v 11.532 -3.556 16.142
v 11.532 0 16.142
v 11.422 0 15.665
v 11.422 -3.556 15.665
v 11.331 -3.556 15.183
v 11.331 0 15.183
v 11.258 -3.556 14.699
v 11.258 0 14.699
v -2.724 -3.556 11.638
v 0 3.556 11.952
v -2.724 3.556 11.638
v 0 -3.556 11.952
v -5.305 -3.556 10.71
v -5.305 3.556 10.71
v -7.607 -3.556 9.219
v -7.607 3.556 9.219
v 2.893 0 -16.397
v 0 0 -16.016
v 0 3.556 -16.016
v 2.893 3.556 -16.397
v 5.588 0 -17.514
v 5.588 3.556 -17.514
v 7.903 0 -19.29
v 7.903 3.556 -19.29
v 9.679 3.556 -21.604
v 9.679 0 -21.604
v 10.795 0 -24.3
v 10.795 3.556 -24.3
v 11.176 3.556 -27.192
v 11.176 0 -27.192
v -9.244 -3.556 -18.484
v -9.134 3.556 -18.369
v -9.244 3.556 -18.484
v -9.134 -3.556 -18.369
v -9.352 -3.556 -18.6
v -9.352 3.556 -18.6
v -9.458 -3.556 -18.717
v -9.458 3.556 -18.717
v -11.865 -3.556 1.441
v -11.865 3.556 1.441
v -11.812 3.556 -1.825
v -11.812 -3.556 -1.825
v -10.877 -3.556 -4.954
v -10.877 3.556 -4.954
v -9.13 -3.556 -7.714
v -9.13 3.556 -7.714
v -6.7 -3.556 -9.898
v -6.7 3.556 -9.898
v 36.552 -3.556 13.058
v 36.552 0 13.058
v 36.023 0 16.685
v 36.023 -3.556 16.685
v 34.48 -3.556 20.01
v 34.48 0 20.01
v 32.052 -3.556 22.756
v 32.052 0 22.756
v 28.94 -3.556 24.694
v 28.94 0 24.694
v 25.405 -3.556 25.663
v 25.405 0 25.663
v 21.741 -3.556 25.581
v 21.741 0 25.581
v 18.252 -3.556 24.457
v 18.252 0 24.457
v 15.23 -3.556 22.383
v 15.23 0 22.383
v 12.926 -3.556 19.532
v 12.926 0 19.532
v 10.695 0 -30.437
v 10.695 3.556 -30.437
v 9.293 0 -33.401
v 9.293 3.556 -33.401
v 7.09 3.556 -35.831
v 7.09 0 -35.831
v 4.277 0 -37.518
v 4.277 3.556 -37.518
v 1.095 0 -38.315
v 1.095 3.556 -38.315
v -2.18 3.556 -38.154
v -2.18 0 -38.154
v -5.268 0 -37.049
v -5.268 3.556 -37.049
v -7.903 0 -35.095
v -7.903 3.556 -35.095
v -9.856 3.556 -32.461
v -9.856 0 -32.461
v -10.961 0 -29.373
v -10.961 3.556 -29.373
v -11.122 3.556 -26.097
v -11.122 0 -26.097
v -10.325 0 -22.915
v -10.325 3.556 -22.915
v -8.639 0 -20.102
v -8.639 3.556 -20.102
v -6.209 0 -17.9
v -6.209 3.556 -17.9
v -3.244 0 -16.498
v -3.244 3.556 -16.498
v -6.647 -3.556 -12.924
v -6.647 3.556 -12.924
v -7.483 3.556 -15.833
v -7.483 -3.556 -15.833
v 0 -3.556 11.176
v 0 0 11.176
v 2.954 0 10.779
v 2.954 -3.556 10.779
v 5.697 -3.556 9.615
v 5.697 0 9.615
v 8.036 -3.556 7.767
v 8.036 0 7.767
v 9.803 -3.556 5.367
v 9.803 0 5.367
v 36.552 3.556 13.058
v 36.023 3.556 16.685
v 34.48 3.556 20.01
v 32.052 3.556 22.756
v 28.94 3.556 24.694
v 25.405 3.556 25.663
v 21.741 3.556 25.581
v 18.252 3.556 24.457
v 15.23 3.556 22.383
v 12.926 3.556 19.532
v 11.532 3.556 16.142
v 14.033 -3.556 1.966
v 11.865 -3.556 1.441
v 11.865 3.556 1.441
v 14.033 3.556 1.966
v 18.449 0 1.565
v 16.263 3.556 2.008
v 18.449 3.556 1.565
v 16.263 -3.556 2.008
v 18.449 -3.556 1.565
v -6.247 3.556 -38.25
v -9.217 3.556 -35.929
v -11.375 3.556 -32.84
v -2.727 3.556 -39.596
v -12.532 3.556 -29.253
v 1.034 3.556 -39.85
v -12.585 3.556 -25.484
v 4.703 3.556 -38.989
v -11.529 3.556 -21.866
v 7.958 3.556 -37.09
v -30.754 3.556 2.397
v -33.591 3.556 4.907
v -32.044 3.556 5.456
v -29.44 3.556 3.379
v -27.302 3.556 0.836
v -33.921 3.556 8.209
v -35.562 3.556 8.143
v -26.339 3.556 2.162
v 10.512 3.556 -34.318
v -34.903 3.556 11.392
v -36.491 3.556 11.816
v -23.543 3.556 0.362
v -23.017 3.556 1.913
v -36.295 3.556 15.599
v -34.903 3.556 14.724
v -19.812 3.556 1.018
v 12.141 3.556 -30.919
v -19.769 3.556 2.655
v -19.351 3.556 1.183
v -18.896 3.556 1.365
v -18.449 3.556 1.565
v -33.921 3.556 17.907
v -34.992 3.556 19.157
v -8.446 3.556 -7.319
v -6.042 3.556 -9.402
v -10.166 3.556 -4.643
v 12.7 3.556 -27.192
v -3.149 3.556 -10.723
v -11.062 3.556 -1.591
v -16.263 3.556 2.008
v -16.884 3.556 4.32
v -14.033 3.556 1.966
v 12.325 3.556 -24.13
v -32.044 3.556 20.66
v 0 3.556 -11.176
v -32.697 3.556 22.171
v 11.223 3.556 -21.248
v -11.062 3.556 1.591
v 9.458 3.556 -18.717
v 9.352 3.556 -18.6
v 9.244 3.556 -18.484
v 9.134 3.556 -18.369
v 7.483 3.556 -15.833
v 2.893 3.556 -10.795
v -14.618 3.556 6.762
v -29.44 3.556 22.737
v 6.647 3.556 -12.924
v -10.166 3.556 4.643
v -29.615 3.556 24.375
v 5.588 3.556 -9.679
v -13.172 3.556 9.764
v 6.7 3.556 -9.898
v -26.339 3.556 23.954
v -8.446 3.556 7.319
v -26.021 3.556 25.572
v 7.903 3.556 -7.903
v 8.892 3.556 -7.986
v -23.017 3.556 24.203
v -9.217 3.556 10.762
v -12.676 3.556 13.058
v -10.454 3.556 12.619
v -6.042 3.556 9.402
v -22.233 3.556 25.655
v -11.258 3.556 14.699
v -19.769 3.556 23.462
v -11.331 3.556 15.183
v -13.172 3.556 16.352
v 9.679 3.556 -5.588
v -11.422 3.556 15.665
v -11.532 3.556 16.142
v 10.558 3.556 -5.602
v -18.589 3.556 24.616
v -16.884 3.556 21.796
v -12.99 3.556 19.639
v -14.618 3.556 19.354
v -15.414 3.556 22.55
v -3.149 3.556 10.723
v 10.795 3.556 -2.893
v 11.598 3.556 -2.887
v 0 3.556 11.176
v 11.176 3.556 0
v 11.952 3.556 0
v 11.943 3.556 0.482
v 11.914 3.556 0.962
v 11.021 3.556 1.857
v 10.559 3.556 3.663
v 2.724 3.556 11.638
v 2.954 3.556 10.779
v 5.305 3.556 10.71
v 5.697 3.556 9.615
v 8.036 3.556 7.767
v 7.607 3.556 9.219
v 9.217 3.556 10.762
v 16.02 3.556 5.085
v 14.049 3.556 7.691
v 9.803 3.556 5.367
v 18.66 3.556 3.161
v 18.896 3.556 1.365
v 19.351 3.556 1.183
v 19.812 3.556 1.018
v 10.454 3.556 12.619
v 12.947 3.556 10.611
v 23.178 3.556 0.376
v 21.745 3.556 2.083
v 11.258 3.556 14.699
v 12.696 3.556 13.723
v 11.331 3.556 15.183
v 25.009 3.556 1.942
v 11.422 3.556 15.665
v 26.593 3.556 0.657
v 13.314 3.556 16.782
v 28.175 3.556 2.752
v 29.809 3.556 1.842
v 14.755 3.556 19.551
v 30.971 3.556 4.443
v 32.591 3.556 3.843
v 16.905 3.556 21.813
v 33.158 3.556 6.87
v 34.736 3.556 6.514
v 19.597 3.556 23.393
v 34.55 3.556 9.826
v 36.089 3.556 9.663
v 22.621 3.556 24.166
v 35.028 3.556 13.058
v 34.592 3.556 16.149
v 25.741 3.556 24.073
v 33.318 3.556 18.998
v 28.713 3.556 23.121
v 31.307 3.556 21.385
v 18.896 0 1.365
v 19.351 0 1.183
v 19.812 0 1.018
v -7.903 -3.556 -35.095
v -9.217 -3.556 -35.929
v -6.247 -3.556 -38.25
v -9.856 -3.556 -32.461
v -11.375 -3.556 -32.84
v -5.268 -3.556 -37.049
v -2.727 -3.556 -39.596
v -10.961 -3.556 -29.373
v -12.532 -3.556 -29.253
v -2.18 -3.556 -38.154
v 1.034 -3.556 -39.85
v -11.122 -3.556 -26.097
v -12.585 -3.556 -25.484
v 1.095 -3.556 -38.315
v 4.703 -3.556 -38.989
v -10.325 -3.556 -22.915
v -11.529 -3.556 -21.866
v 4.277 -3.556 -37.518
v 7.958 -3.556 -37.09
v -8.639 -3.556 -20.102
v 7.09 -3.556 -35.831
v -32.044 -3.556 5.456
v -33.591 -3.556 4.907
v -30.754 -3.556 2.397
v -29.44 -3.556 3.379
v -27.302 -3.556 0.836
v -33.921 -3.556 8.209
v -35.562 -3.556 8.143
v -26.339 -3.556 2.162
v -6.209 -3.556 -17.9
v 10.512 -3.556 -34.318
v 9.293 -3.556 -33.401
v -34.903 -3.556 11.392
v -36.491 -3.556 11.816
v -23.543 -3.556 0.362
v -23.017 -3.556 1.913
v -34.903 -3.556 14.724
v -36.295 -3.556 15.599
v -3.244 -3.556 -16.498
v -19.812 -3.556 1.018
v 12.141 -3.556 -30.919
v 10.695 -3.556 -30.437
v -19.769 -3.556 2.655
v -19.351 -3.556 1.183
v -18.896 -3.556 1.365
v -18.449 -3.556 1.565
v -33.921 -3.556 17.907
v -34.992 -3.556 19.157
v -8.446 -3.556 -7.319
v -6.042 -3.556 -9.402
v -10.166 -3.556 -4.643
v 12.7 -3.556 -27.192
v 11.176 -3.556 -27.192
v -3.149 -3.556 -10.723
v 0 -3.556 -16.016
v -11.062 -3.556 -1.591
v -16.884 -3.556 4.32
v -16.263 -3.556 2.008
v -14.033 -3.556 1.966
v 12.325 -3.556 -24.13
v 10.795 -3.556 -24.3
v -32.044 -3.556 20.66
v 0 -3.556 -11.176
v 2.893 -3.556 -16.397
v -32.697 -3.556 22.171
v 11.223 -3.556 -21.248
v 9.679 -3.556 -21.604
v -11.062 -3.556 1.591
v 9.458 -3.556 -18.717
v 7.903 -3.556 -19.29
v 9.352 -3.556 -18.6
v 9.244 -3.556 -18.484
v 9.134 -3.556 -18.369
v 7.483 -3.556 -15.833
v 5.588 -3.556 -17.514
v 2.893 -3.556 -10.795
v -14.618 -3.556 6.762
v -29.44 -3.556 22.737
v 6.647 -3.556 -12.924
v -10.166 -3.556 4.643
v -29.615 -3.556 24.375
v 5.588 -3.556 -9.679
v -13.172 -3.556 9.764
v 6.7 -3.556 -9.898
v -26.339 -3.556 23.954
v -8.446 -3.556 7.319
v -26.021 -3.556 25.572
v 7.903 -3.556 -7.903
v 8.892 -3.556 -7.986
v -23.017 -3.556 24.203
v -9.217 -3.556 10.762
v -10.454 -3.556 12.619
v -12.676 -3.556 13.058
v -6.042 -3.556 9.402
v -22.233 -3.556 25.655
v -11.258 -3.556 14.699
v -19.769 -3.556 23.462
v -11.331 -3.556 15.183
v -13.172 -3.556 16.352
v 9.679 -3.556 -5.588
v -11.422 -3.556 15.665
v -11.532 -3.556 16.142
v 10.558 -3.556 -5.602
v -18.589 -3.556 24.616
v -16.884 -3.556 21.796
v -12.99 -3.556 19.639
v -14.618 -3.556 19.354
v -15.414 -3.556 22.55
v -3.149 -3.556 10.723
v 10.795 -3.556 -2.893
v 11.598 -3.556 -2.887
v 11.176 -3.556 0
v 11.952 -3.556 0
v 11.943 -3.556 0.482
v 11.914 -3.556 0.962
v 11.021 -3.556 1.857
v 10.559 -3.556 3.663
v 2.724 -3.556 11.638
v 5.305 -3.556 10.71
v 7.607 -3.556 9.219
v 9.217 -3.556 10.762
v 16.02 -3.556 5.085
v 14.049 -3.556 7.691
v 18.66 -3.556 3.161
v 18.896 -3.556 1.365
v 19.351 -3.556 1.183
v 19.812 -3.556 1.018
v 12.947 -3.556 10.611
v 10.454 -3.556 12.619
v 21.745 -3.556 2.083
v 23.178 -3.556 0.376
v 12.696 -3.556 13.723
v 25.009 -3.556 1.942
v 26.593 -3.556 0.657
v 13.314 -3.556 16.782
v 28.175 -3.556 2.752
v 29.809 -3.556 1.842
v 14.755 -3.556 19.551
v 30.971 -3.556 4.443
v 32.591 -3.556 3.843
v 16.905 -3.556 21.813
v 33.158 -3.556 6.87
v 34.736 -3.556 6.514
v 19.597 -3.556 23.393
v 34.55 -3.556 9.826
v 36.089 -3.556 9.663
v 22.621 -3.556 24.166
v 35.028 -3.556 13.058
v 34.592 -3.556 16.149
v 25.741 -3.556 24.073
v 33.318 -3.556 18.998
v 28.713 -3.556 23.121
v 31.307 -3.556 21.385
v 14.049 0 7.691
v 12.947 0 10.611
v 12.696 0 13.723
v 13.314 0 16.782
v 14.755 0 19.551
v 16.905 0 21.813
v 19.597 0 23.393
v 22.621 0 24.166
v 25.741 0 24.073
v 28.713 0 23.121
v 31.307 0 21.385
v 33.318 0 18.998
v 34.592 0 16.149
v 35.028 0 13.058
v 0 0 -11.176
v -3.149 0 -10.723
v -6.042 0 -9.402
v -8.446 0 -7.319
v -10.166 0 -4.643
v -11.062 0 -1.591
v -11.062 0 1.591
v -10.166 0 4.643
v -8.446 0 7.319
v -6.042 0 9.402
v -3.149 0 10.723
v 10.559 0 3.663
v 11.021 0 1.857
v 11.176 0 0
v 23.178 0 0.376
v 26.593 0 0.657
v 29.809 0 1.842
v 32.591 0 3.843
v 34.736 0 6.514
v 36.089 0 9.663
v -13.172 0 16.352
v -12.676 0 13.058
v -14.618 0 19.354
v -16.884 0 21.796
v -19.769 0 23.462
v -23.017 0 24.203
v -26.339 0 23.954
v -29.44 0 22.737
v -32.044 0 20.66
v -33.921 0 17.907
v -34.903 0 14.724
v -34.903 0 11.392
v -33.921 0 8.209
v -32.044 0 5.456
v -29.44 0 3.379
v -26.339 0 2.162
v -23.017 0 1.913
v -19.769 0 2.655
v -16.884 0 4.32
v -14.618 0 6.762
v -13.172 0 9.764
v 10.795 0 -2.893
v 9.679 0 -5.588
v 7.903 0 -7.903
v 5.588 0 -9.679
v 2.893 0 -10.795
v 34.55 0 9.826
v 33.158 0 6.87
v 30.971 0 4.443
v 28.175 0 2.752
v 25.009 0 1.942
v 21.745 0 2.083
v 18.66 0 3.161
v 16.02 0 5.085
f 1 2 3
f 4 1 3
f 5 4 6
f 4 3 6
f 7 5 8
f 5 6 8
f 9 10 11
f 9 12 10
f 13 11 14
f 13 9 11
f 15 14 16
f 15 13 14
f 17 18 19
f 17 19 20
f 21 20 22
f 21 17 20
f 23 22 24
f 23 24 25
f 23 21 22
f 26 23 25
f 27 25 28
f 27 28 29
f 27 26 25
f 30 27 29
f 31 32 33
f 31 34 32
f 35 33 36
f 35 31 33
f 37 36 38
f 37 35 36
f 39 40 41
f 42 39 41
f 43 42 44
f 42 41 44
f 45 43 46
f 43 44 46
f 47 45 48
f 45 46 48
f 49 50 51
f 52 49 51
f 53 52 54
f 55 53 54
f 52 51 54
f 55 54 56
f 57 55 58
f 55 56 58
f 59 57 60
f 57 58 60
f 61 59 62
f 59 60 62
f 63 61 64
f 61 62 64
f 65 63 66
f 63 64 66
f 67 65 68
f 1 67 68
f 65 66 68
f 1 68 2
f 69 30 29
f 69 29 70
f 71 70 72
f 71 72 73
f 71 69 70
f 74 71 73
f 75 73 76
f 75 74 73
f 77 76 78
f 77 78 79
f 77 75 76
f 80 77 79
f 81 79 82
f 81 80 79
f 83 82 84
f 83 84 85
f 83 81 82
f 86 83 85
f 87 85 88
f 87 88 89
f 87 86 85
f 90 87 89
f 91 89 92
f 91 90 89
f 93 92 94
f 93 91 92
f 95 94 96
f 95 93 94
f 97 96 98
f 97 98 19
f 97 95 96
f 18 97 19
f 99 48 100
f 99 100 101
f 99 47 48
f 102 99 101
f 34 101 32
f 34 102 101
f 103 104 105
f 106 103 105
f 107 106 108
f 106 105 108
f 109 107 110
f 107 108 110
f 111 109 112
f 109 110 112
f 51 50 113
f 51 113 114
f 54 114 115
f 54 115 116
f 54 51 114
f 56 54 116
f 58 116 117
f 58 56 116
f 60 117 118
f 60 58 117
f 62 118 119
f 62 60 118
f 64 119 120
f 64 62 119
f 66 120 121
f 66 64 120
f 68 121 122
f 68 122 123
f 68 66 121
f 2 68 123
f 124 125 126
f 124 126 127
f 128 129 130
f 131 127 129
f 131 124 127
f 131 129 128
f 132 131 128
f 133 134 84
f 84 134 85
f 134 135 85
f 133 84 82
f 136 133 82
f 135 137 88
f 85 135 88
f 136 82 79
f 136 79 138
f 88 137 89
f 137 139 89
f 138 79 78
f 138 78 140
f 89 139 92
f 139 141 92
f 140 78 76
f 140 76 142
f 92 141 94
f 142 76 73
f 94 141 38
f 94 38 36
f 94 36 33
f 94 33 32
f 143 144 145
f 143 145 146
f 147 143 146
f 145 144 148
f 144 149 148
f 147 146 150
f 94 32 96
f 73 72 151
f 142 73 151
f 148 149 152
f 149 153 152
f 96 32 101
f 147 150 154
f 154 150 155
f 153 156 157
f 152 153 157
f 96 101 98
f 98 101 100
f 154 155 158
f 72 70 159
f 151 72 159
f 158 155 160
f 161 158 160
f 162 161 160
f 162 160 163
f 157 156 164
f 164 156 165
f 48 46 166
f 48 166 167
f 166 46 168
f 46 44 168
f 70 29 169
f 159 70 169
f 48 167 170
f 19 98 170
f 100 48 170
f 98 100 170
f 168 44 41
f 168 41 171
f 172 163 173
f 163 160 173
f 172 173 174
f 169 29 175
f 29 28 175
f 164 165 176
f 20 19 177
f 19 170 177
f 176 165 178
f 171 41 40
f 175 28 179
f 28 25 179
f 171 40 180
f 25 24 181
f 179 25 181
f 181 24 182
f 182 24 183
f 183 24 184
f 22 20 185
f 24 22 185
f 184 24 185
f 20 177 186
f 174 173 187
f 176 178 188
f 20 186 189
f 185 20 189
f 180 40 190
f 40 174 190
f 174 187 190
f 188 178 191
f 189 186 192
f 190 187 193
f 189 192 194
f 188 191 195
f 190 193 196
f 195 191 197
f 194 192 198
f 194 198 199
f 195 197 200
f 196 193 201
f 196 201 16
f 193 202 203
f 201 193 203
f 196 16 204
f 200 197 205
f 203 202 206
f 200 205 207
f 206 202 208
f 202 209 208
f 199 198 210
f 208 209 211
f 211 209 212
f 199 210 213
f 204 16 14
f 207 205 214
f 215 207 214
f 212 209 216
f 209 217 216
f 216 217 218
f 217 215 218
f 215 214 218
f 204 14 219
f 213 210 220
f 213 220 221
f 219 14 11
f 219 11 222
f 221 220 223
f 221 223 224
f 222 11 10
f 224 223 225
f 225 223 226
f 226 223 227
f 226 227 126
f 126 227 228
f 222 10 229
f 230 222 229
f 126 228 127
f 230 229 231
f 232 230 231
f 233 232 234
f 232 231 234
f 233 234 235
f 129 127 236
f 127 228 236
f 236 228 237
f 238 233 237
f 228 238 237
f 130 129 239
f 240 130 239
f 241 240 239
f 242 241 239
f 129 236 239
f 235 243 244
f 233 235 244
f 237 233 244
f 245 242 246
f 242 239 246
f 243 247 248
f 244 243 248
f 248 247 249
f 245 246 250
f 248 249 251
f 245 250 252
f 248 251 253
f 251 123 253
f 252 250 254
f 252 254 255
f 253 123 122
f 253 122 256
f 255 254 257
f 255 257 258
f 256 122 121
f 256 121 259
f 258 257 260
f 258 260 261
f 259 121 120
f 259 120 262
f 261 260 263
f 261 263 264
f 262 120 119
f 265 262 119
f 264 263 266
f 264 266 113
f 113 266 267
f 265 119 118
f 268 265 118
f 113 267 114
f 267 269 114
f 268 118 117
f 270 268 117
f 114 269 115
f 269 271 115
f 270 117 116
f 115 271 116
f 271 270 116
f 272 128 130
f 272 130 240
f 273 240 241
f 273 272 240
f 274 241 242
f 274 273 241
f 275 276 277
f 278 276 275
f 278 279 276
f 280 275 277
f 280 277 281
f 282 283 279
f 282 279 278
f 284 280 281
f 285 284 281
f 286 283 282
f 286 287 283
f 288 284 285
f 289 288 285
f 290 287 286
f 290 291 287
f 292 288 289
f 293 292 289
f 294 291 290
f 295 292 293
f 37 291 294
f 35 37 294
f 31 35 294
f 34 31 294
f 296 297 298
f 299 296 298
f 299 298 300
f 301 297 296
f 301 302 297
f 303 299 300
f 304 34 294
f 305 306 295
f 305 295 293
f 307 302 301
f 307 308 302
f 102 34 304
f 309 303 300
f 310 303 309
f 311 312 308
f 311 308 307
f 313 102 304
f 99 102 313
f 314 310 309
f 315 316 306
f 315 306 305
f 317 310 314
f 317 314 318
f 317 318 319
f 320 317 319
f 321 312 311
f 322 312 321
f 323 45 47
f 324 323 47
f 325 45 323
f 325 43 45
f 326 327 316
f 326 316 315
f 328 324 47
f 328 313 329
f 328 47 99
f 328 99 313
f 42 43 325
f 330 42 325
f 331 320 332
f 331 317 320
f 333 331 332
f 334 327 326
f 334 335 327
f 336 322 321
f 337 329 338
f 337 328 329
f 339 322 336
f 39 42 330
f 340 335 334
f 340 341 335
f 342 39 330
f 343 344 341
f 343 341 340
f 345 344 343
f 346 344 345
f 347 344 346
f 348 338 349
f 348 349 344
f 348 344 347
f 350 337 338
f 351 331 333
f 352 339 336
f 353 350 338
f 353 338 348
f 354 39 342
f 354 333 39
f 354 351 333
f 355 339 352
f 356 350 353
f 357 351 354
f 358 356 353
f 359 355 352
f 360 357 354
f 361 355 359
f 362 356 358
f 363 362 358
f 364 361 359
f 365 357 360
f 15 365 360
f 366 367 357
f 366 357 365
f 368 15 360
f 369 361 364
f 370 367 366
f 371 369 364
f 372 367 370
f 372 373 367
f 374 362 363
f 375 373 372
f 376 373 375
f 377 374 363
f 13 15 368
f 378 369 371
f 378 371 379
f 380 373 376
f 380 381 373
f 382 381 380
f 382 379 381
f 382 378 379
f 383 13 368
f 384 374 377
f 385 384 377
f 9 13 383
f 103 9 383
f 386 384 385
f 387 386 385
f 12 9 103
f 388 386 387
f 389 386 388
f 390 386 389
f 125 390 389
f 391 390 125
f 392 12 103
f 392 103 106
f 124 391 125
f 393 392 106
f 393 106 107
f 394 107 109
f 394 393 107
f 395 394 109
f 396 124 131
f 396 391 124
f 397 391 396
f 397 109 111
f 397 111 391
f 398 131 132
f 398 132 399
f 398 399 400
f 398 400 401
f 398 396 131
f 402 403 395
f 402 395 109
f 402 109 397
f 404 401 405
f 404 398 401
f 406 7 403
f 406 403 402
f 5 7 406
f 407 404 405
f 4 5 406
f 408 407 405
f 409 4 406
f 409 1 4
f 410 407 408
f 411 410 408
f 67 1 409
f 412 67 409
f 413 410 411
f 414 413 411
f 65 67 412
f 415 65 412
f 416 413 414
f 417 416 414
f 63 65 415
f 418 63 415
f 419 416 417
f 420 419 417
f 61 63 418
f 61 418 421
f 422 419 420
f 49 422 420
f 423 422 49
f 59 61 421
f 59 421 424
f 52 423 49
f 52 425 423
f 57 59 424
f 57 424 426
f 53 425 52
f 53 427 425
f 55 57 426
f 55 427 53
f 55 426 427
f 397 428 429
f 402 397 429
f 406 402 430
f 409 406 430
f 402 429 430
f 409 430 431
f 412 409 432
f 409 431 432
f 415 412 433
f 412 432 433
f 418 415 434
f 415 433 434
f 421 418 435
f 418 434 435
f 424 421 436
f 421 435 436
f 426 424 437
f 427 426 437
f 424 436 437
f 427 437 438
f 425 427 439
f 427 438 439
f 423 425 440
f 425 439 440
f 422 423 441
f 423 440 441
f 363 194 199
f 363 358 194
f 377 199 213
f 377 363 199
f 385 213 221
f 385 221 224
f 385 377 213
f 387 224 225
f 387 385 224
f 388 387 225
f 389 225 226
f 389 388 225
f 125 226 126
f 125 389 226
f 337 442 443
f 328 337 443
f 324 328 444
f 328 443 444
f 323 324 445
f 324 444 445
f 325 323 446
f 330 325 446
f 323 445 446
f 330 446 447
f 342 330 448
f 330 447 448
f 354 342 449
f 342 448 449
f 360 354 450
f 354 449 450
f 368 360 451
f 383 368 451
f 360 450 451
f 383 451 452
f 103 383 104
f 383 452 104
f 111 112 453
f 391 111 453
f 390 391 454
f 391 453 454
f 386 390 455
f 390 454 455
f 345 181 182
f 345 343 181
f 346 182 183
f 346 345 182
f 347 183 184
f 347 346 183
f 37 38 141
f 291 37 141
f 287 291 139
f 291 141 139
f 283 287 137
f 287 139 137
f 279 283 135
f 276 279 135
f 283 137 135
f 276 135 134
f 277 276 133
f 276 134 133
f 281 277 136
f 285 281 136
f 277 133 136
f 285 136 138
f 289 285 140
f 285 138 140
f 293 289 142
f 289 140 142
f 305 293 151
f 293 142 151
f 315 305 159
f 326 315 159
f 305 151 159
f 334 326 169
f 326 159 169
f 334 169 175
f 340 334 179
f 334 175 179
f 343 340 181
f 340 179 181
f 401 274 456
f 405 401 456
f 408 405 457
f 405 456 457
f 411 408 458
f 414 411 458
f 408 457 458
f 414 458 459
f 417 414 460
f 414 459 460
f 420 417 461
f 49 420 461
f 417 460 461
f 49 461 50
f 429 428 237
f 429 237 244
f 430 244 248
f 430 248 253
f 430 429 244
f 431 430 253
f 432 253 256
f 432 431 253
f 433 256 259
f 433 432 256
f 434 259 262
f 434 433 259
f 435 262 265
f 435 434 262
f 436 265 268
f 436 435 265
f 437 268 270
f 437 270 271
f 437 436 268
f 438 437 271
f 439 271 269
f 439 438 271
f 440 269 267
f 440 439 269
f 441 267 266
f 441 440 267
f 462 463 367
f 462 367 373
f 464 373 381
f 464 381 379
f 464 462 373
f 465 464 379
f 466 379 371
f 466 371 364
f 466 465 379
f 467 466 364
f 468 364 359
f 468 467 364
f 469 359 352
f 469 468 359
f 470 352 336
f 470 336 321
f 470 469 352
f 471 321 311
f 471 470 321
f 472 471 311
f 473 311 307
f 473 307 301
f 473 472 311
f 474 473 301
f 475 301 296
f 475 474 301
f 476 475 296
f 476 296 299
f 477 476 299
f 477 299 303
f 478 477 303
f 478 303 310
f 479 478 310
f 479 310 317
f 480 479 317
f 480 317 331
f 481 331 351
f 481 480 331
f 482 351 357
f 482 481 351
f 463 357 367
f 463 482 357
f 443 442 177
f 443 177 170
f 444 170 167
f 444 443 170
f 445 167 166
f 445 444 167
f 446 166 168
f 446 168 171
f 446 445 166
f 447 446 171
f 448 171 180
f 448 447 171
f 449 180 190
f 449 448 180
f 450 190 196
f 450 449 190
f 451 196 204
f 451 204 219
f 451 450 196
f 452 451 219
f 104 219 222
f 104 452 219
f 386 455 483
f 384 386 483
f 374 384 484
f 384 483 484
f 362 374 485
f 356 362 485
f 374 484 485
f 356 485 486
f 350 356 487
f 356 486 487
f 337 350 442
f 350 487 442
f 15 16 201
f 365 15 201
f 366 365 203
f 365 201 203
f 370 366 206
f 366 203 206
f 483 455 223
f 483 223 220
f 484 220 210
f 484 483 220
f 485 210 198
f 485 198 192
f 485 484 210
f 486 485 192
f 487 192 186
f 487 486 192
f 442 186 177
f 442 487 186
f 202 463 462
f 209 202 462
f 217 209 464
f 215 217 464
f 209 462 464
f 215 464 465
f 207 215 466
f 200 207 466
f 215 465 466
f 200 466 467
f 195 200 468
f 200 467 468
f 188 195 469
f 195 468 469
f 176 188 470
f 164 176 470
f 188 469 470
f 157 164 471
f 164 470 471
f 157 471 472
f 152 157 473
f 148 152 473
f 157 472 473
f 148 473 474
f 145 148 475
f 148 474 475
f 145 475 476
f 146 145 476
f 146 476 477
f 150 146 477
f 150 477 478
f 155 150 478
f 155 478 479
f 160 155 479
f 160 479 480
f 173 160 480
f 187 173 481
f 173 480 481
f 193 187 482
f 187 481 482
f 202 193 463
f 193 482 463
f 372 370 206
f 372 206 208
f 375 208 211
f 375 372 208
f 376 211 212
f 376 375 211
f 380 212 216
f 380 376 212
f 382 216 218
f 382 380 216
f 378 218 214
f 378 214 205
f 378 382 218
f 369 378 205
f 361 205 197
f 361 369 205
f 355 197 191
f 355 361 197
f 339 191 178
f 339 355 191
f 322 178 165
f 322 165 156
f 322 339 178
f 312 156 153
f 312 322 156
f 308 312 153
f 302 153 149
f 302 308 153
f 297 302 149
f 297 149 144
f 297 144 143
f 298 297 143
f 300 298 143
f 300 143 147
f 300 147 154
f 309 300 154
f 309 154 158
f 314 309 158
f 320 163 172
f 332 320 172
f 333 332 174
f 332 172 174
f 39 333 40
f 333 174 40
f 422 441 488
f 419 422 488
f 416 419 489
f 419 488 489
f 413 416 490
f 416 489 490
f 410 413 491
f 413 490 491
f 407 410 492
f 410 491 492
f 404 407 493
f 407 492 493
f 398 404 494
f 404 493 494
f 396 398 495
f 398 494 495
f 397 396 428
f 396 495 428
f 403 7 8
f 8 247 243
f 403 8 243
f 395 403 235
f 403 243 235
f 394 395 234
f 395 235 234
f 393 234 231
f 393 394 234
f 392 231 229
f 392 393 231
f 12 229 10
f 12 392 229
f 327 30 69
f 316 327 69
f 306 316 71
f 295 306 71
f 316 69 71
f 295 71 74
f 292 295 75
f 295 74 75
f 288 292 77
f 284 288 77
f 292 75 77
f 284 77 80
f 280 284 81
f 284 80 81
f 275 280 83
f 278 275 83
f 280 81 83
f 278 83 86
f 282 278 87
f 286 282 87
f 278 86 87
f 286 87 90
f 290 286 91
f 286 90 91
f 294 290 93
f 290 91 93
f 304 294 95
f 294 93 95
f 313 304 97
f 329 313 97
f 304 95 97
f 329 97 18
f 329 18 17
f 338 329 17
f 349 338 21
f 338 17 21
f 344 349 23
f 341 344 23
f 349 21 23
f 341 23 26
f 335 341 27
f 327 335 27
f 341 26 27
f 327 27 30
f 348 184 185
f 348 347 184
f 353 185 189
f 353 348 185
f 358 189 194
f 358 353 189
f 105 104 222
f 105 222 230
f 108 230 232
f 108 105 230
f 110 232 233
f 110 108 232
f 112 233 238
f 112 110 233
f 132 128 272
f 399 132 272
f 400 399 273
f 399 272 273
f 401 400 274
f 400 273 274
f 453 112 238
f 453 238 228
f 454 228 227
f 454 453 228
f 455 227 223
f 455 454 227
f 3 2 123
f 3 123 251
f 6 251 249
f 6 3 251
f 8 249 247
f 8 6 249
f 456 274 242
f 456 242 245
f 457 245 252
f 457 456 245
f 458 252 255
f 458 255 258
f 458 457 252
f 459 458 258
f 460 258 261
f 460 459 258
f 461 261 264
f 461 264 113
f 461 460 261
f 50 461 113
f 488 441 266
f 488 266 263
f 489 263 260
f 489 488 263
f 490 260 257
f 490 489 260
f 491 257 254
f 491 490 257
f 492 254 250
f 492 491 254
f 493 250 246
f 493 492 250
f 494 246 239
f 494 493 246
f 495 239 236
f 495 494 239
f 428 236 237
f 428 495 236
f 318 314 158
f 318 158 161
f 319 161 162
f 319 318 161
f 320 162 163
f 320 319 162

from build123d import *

# Parameters (mm, degrees)
F0_R     = 11.176
F1_DEPTH = 3.556


with BuildPart() as f1:
    # F0 (on Front) → F1 (new body, symmetric)
    with BuildSketch(Plane.XZ):
        with BuildLine():
            ThreePointArc((6.7002799246, -9.8976827694), (10.5579766794, -5.6024105266), (11.9523167324, 0))
            ThreePointArc((11.9523167324, 0), (11.9304871649, 0.7220465922), (11.8650782007, 1.4414557099))
            ThreePointArc((11.8650782007, 1.4414557099), (11.3793199415, 3.6563578792), (10.4839962384, 5.7396601071))
            Line((10.4839962384, 5.7396601071), (9.8030486125, 5.3668625751))
            ThreePointArc((9.8030486125, 5.3668625751), (10.8273230139, 2.7698469909), (11.176, 0))
            ThreePointArc((11.176, 0), (7.9026253865, -7.9026253865), (0, -11.176))
            Line((0, -11.176), (0, -11.9523167324))
            ThreePointArc((0, -11.9523167324), (3.5041144313, -11.42711938), (6.7002799246, -9.8976827694))
        make_face()
        with BuildLine():
            ThreePointArc((10.4839962384, 5.7396601071), (11.3793199415, 3.6563578792), (11.8650782007, 1.4414557099))
            ThreePointArc((11.8650782007, 1.4414557099), (15.1468517315, 2.0483664496), (18.4490286697, 1.5646251732))
            ThreePointArc((18.4490286697, 1.5646251732), (15.1517773463, 3.8060939797), (12.7119618322, 6.9594016014))
            Line((12.7119618322, 6.9594016014), (10.4839962384, 5.7396601071))
        make_face()
        with BuildLine():
            ThreePointArc((9.1344120356, -18.3689094107), (6.9562324961, -14.4094635558), (6.7002799246, -9.8976827694))
            ThreePointArc((6.7002799246, -9.8976827694), (3.5041144313, -11.42711938), (0, -11.9523167324))
            Line((0, -11.9523167324), (0, -14.4923167324))
            ThreePointArc((0, -14.4923167324), (4.9614880336, -15.5015666926), (9.1344120356, -18.3689094107))
        make_face()
        with BuildLine():
            Line((9.8030486125, 5.3668625751), (10.4839962384, 5.7396601071))
            ThreePointArc((10.4839962384, 5.7396601071), (9.2113316577, 7.6163800039), (7.6071320504, 9.2189705087))
            ThreePointArc((7.6071320504, 9.2189705087), (4.0416469295, 11.2482427681), (0, 11.9523167324))
            Line((0, 11.9523167324), (0, 11.176))
            ThreePointArc((0, 11.176), (5.6974959351, 9.6146511153), (9.8030486125, 5.3668625751))
        make_face()
        with BuildLine():
            ThreePointArc((7.6071320504, 9.2189705087), (9.2113316577, 7.6163800039), (10.4839962384, 5.7396601071))
            Line((10.4839962384, 5.7396601071), (12.7119618322, 6.9594016014))
            ThreePointArc((12.7119618322, 6.9594016014), (11.3700398508, 10.7137716013), (11.2582654612, 14.6991894196))
            ThreePointArc((11.2582654612, 14.6991894196), (9.8866064691, 11.6566691217), (7.6071320504, 9.2189705087))
        make_face()
        with BuildLine():
            ThreePointArc((19.8117182154, 1.0178507045), (19.1402143158, 1.3157636909), (18.4490286697, 1.5646251732))
            ThreePointArc((18.4490286697, 1.5646251732), (19.1224650067, 1.2715282716), (19.8117182154, 1.0178507045))
        make_face()
        with BuildLine():
            ThreePointArc((12.7119618322, 6.9594016014), (15.1517773463, 3.8060939797), (18.4490286697, 1.5646251732))
            ThreePointArc((18.4490286697, 1.5646251732), (19.1402143158, 1.3157636909), (19.8117182154, 1.0178507045))
            ThreePointArc((19.8117182154, 1.0178507045), (31.2673508338, 2.7479463892), (36.551789801, 13.0581090731))
            ThreePointArc((36.551789801, 13.0581090731), (25.4052864941, 25.6627371131), (11.5318452302, 16.1417701721))
            ThreePointArc((11.5318452302, 16.1417701721), (11.4210189836, 15.415555894), (11.2582654612, 14.6991894196))
            ThreePointArc((11.2582654612, 14.6991894196), (11.3700398508, 10.7137716013), (12.7119618322, 6.9594016014))
        make_face()
        with BuildLine():
            ThreePointArc((35.027789801, 13.0581090731), (26.6216367919, 2.2307860593), (14.0487411884, 7.691246498))
            ThreePointArc((14.0487411884, 7.691246498), (21.0819428101, 23.885432087), (35.027789801, 13.0581090731))
        make_face(mode=Mode.SUBTRACT)
        with BuildLine():
            Line((0, -14.4923167324), (0, -11.9523167324))
            ThreePointArc((0, -11.9523167324), (-3.5041144313, -11.42711938), (-6.7002799246, -9.8976827694))
            ThreePointArc((-6.7002799246, -9.8976827694), (-6.9562324961, -14.4094635558), (-9.1344120356, -18.3689094107))
            ThreePointArc((-9.1344120356, -18.3689094107), (-4.9614880336, -15.5015666926), (0, -14.4923167324))
        make_face()
        with BuildLine():
            ThreePointArc((-6.7002799246, -9.8976827694), (-3.5041144313, -11.42711938), (0, -11.9523167324))
            Line((0, -11.9523167324), (0, -11.176))
            ThreePointArc((0, -11.176), (-11.176, 0), (0, 11.176))
            Line((0, 11.176), (0, 11.9523167324))
            ThreePointArc((0, 11.9523167324), (-4.0416469295, 11.2482427681), (-7.6071320504, 9.2189705087))
            ThreePointArc((-7.6071320504, 9.2189705087), (-10.4839962384, 5.7396601071), (-11.8650782007, 1.4414557099))
            ThreePointArc((-11.8650782007, 1.4414557099), (-10.8771386837, -4.9543646745), (-6.7002799246, -9.8976827694))
        make_face()
        with BuildLine():
            ThreePointArc((9.4583258088, -18.7170543238), (9.2943419701, -18.544867742), (9.1344120356, -18.3689094107))
            ThreePointArc((9.1344120356, -18.3689094107), (4.9614880336, -15.5015666926), (0, -14.4923167324))
            ThreePointArc((0, -14.4923167324), (-4.9614880336, -15.5015666926), (-9.1344120356, -18.3689094107))
            ThreePointArc((-9.1344120356, -18.3689094107), (-9.2943419701, -18.544867742), (-9.4583258088, -18.7170543238))
            ThreePointArc((-9.4583258088, -18.7170543238), (-4.5370288862, -39.0542461238), (12.7, -27.1923167324))
            ThreePointArc((12.7, -27.1923167324), (11.8619293914, -22.6552878462), (9.4583258088, -18.7170543238))
        make_face()
        with BuildLine():
            ThreePointArc((11.176, -27.1923167324), (-7.9026253865, -35.094942119), (0, -16.0163167324))
            ThreePointArc((0, -16.0163167324), (7.9026253865, -19.2896913459), (11.176, -27.1923167324))
        make_face(mode=Mode.SUBTRACT)
        with BuildLine():
            ThreePointArc((9.4583258088, -18.7170543238), (9.2979985135, -18.5414656967), (9.1344120356, -18.3689094107))
            ThreePointArc((9.1344120356, -18.3689094107), (9.2943419701, -18.544867742), (9.4583258088, -18.7170543238))
        make_face()
        with BuildLine():
            ThreePointArc((11.5318452302, 16.1417701721), (11.3741901482, 15.4244367985), (11.2582654612, 14.6991894196))
            ThreePointArc((11.2582654612, 14.6991894196), (11.4210189836, 15.415555894), (11.5318452302, 16.1417701721))
        make_face()
        with BuildLine():
            ThreePointArc((-18.4490286697, 1.5646251732), (-15.1468517315, 2.0483664496), (-11.8650782007, 1.4414557099))
            ThreePointArc((-11.8650782007, 1.4414557099), (-10.4839962384, 5.7396601071), (-7.6071320504, 9.2189705087))
            ThreePointArc((-7.6071320504, 9.2189705087), (-9.8866064691, 11.6566691217), (-11.2582654612, 14.6991894196))
            ThreePointArc((-11.2582654612, 14.6991894196), (-11.178436671, 13.8803745062), (-11.151789801, 13.0581090731))
            ThreePointArc((-11.151789801, 13.0581090731), (-13.1301978864, 6.2509461681), (-18.4490286697, 1.5646251732))
        make_face()
        with BuildLine():
            ThreePointArc((-9.4583258088, -18.7170543238), (-9.2943419701, -18.544867742), (-9.1344120356, -18.3689094107))
            ThreePointArc((-9.1344120356, -18.3689094107), (-9.2979985135, -18.5414656967), (-9.4583258088, -18.7170543238))
        make_face()
        with BuildLine():
            ThreePointArc((-19.8117182154, 1.0178507045), (-19.1224650067, 1.2715282716), (-18.4490286697, 1.5646251732))
            ThreePointArc((-18.4490286697, 1.5646251732), (-19.1402143158, 1.3157636909), (-19.8117182154, 1.0178507045))
        make_face()
        with BuildLine():
            ThreePointArc((-19.8117182154, 1.0178507045), (-19.1402143158, 1.3157636909), (-18.4490286697, 1.5646251732))
            ThreePointArc((-18.4490286697, 1.5646251732), (-13.1301978864, 6.2509461681), (-11.151789801, 13.0581090731))
            ThreePointArc((-11.151789801, 13.0581090731), (-11.178436671, 13.8803745062), (-11.2582654612, 14.6991894196))
            ThreePointArc((-11.2582654612, 14.6991894196), (-11.4210189836, 15.415555894), (-11.5318452302, 16.1417701721))
            ThreePointArc((-11.5318452302, 16.1417701721), (-34.9916177698, 19.1568165449), (-19.8117182154, 1.0178507045))
        make_face()
        with Locations((-23.851789801, 13.0581090731)):
            Circle(F0_R, mode=Mode.SUBTRACT)
        with BuildLine():
            ThreePointArc((-11.5318452302, 16.1417701721), (-11.4210189836, 15.415555894), (-11.2582654612, 14.6991894196))
            ThreePointArc((-11.2582654612, 14.6991894196), (-11.3741901482, 15.4244367985), (-11.5318452302, 16.1417701721))
        make_face()
    extrude(amount=F1_DEPTH, both=True)


solid = f1.part
